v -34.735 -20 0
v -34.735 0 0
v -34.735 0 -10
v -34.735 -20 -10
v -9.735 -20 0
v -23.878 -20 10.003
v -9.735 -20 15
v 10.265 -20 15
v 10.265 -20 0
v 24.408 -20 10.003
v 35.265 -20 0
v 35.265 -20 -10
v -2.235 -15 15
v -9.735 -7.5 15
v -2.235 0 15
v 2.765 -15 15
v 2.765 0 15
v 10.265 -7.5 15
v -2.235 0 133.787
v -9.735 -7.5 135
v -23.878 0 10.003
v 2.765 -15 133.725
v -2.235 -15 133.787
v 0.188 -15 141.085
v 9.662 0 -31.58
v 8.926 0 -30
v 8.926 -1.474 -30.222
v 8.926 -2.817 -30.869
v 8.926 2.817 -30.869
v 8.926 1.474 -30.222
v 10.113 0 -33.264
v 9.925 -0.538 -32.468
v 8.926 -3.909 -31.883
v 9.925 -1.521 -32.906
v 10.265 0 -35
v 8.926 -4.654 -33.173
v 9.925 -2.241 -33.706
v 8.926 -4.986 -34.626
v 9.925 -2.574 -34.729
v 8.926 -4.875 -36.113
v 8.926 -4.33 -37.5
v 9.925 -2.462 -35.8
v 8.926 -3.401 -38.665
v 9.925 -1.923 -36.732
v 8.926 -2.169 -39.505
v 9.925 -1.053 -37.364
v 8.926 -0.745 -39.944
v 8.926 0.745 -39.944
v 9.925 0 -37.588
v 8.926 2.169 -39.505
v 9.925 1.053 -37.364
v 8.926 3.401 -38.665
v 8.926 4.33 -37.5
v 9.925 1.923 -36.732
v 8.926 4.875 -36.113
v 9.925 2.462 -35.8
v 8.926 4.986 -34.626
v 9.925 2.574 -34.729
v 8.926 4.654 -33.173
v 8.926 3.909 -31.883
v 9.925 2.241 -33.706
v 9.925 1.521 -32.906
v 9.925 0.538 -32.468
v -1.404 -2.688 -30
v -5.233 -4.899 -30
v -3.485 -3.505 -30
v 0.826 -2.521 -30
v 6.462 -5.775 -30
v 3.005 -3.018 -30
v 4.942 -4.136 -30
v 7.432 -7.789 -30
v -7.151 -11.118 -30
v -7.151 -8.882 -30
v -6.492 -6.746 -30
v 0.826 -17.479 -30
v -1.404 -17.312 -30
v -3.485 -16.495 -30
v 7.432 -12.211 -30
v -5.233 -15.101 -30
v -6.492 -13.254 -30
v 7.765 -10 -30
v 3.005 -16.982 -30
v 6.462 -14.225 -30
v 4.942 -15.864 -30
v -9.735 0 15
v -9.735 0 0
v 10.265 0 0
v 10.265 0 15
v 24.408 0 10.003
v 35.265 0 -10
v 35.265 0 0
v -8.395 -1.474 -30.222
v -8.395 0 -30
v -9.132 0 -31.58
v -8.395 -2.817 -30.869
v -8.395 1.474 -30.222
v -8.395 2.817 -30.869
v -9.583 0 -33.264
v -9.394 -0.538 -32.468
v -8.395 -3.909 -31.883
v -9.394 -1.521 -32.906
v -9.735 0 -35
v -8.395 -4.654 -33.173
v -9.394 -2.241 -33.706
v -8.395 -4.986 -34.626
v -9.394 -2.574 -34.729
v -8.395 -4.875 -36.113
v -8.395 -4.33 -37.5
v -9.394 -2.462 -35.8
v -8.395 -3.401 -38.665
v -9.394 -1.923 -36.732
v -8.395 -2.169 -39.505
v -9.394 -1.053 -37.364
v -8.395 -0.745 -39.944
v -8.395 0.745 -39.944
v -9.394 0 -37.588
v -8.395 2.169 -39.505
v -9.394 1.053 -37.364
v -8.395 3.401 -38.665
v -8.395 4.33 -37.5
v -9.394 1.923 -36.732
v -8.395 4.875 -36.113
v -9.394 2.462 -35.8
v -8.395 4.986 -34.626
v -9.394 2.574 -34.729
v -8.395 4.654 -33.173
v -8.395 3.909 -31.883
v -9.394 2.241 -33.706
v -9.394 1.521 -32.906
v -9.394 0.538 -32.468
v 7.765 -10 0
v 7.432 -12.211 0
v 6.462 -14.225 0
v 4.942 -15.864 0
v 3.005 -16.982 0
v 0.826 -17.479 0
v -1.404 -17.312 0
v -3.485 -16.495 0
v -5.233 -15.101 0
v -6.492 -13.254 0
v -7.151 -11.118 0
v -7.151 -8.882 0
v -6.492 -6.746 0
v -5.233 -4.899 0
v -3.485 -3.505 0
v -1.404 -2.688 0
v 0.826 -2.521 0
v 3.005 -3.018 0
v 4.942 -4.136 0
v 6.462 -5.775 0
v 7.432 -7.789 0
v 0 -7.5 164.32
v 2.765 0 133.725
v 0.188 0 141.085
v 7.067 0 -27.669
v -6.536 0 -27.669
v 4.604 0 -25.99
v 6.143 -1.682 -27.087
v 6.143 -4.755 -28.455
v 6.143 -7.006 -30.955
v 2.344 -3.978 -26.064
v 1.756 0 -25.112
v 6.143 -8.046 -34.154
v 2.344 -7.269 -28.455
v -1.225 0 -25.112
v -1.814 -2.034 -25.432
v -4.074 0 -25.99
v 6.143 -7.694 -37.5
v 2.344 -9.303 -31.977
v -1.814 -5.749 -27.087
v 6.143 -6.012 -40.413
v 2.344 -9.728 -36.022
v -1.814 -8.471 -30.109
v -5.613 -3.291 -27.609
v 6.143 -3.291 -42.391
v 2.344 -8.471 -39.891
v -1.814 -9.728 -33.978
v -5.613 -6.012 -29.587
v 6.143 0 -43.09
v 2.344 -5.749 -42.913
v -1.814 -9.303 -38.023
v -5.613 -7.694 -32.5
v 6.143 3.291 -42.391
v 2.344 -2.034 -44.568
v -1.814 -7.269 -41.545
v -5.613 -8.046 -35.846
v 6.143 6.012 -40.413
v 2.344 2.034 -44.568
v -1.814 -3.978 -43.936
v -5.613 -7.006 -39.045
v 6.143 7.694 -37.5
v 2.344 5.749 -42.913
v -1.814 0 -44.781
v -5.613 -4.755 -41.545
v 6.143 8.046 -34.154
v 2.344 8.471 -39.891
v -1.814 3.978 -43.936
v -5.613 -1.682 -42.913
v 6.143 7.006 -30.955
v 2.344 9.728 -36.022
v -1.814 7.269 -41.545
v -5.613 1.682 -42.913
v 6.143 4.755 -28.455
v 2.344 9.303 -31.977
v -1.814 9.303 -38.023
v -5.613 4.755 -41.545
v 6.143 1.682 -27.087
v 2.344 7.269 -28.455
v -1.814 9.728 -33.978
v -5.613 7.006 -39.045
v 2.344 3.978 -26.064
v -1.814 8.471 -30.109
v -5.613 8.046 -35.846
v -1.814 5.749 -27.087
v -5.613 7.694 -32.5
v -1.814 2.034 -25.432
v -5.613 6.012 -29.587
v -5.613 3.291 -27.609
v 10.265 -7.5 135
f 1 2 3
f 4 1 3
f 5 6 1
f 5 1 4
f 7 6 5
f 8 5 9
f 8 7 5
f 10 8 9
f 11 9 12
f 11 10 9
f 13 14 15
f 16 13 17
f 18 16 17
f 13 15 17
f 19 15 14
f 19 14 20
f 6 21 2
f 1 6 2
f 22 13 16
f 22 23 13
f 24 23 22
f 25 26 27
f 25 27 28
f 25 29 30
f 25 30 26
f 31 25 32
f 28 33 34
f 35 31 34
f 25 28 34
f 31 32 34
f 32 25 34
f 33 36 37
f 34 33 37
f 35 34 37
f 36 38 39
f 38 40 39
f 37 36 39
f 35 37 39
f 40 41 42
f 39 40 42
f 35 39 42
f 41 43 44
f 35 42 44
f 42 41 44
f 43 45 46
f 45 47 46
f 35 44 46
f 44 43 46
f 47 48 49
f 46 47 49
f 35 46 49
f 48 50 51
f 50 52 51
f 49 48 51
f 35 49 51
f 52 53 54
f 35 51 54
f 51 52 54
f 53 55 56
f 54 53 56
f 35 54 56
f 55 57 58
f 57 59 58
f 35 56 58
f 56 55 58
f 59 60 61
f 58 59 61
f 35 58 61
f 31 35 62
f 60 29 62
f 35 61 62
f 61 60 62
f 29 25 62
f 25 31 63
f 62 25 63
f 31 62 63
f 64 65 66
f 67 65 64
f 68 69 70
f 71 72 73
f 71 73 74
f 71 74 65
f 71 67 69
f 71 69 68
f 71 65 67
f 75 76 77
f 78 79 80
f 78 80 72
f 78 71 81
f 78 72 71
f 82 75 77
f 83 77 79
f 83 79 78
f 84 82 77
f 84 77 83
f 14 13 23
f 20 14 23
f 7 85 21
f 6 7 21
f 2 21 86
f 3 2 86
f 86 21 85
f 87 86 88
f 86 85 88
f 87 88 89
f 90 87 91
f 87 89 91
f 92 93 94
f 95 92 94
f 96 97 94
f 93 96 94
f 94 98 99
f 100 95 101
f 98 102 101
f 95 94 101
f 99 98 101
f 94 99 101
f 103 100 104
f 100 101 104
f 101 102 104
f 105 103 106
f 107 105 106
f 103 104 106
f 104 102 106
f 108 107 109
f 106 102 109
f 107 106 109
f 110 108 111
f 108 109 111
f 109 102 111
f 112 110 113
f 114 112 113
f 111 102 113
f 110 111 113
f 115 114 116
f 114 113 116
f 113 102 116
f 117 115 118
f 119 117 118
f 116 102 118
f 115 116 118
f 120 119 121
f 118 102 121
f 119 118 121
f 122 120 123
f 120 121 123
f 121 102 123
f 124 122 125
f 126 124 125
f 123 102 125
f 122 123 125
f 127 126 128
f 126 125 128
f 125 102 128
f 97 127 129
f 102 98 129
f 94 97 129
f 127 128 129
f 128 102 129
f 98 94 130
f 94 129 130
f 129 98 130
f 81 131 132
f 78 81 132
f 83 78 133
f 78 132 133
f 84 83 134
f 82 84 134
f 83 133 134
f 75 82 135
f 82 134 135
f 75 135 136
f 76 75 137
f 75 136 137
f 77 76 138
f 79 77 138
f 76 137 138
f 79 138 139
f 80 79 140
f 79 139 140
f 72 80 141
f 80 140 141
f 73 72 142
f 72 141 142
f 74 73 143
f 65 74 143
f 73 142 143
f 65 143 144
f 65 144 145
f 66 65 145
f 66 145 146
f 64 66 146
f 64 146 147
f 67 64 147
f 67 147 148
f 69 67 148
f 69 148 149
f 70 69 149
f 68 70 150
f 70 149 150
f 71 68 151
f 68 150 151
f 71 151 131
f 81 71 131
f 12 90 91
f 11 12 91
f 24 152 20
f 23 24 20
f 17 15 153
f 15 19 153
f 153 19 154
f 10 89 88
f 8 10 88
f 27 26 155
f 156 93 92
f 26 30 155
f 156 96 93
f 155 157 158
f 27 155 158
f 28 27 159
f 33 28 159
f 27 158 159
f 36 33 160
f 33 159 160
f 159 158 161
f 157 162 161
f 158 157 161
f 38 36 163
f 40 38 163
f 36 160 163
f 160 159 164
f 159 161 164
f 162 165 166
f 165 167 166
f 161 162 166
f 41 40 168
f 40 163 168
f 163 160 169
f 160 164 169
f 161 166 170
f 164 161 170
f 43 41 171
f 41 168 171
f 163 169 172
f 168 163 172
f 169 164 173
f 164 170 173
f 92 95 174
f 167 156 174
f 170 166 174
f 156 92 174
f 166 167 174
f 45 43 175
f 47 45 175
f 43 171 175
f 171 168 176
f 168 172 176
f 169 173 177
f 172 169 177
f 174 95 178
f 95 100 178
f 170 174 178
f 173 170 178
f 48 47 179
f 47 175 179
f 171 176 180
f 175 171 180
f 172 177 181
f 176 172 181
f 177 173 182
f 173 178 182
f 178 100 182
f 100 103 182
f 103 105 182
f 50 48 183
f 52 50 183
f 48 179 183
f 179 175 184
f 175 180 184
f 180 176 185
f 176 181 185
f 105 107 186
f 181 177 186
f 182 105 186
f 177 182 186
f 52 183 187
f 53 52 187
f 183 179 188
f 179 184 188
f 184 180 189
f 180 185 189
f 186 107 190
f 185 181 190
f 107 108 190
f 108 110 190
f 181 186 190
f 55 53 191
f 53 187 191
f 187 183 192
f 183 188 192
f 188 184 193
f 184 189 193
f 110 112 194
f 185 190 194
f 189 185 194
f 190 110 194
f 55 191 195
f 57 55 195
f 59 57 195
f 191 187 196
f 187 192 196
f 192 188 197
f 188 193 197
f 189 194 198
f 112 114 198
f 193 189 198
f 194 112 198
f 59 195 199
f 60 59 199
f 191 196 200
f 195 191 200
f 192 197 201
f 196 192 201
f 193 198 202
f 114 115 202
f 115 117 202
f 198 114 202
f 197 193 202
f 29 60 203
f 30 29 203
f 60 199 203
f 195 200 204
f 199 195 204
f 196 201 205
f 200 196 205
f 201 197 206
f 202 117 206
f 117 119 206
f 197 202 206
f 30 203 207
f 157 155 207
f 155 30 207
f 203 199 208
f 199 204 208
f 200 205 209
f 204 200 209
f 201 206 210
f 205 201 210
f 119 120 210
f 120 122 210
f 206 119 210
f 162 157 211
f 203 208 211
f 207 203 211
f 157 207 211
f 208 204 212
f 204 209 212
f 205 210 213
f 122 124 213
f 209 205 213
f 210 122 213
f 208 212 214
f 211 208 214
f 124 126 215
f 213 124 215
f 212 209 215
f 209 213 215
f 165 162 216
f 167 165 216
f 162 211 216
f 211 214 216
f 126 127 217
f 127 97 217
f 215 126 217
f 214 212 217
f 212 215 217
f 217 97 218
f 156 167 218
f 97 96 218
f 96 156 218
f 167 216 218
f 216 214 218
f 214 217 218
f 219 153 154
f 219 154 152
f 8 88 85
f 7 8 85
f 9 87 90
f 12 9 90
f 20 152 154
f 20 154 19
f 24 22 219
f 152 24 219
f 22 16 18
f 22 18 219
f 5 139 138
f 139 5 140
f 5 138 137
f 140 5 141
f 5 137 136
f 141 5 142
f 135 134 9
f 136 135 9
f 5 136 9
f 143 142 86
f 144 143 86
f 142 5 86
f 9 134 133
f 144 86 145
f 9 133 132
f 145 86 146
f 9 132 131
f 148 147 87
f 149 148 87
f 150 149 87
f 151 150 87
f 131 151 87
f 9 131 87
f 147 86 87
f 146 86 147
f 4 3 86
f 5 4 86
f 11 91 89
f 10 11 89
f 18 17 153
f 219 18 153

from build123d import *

# Parameters (mm, degrees)
F1_DEPTH = 20
F0_W     = 20
F0_H     = 120
F2_DEPTH = 15
F3_SIZE  = 7.49999
F5_R     = 7.5
F6_DEPTH = 30


# Not quite as in the source:
# - a fillet or chamfer is up to 0.001 mm smaller than in the source, because OpenCascade refuses the exact size


with BuildPart() as f1:
    # F0 (on Front) → F1 (new body)
    with BuildSketch(Plane.XZ):
        Polygon((-23.8778254464, 10.0028783713), (-34.7346724942, 0), (-9.7346724942, 0), (10.2653275058, 0), (35.2653275058, 0), (24.4084804579, 10.0028783713), (10.2653275058, 15), (-9.7346724942, 15), align=None)
        Polygon((-9.7346724942, 0), (-34.7346724942, 0), (-34.7346724942, -10), align=None)
        Polygon((35.2653275058, 0), (10.2653275058, 0), (35.2653275058, -10), align=None)
    extrude(amount=F1_DEPTH)

    # F5 (on face) → F6 (join)
    with BuildSketch(Plane(origin=(0, 0, 0), x_dir=(1, 0, 0), z_dir=(0, 0, -1))):
        with Locations((0.2653275058, 10)):
            Circle(F5_R)
    extrude(amount=F6_DEPTH)


with BuildPart() as f2:
    # F0 (on Front) → F2 (new body)
    with BuildSketch(Plane.XZ):
        with Locations((0.2653275058, 75)):
            Rectangle(F0_W, F0_H)
        Polygon((0, 164.3196642399), (-9.7346724942, 135), (10.2653275058, 135), align=None)
    extrude(amount=F2_DEPTH)

    # F3 (size 7.5 in the source; OpenCascade refuses exactly that, so slightly less here)
    f3_edges = [f2.edges().sort_by_distance(p)[0] for p in [
        (-9.734672, -15, 75),
        (-9.734672, 0, 75),
        (10.265328, 0, 75),
        (10.265328, -15, 75),
        (5.132664, 0, 149.659832),
        (5.132664, -15, 149.659832),
        (-4.867336, -15, 149.659832),
        (-4.867336, 0, 149.659832),
    ]]
    chamfer(f3_edges, length=F3_SIZE)


with BuildPart() as f4:
    # F0 (on Front) → F4 (revolve)
    with BuildSketch(Plane.XZ):
        with BuildLine():
            Line((8.9255815436, -30), (-8.3949265321, -30))
            ThreePointArc((-8.3949265321, -30), (-9.3939307571, -32.411809549), (-9.7346724942, -35))
            Line((-9.7346724942, -35), (10.2653275058, -35))
            ThreePointArc((10.2653275058, -35), (9.9245857687, -32.411809549), (8.9255815436, -30))
        make_face()
        with BuildLine():
            ThreePointArc((8.9255815436, -30), (0.2653275058, -25), (-8.3949265321, -30))
            Line((-8.3949265321, -30), (8.9255815436, -30))
        make_face()
    revolve(axis=Axis((0.2653275058, 0, -35), (1, 0, 0)))


solid = Compound([f1.part, f2.part, f4.part])
